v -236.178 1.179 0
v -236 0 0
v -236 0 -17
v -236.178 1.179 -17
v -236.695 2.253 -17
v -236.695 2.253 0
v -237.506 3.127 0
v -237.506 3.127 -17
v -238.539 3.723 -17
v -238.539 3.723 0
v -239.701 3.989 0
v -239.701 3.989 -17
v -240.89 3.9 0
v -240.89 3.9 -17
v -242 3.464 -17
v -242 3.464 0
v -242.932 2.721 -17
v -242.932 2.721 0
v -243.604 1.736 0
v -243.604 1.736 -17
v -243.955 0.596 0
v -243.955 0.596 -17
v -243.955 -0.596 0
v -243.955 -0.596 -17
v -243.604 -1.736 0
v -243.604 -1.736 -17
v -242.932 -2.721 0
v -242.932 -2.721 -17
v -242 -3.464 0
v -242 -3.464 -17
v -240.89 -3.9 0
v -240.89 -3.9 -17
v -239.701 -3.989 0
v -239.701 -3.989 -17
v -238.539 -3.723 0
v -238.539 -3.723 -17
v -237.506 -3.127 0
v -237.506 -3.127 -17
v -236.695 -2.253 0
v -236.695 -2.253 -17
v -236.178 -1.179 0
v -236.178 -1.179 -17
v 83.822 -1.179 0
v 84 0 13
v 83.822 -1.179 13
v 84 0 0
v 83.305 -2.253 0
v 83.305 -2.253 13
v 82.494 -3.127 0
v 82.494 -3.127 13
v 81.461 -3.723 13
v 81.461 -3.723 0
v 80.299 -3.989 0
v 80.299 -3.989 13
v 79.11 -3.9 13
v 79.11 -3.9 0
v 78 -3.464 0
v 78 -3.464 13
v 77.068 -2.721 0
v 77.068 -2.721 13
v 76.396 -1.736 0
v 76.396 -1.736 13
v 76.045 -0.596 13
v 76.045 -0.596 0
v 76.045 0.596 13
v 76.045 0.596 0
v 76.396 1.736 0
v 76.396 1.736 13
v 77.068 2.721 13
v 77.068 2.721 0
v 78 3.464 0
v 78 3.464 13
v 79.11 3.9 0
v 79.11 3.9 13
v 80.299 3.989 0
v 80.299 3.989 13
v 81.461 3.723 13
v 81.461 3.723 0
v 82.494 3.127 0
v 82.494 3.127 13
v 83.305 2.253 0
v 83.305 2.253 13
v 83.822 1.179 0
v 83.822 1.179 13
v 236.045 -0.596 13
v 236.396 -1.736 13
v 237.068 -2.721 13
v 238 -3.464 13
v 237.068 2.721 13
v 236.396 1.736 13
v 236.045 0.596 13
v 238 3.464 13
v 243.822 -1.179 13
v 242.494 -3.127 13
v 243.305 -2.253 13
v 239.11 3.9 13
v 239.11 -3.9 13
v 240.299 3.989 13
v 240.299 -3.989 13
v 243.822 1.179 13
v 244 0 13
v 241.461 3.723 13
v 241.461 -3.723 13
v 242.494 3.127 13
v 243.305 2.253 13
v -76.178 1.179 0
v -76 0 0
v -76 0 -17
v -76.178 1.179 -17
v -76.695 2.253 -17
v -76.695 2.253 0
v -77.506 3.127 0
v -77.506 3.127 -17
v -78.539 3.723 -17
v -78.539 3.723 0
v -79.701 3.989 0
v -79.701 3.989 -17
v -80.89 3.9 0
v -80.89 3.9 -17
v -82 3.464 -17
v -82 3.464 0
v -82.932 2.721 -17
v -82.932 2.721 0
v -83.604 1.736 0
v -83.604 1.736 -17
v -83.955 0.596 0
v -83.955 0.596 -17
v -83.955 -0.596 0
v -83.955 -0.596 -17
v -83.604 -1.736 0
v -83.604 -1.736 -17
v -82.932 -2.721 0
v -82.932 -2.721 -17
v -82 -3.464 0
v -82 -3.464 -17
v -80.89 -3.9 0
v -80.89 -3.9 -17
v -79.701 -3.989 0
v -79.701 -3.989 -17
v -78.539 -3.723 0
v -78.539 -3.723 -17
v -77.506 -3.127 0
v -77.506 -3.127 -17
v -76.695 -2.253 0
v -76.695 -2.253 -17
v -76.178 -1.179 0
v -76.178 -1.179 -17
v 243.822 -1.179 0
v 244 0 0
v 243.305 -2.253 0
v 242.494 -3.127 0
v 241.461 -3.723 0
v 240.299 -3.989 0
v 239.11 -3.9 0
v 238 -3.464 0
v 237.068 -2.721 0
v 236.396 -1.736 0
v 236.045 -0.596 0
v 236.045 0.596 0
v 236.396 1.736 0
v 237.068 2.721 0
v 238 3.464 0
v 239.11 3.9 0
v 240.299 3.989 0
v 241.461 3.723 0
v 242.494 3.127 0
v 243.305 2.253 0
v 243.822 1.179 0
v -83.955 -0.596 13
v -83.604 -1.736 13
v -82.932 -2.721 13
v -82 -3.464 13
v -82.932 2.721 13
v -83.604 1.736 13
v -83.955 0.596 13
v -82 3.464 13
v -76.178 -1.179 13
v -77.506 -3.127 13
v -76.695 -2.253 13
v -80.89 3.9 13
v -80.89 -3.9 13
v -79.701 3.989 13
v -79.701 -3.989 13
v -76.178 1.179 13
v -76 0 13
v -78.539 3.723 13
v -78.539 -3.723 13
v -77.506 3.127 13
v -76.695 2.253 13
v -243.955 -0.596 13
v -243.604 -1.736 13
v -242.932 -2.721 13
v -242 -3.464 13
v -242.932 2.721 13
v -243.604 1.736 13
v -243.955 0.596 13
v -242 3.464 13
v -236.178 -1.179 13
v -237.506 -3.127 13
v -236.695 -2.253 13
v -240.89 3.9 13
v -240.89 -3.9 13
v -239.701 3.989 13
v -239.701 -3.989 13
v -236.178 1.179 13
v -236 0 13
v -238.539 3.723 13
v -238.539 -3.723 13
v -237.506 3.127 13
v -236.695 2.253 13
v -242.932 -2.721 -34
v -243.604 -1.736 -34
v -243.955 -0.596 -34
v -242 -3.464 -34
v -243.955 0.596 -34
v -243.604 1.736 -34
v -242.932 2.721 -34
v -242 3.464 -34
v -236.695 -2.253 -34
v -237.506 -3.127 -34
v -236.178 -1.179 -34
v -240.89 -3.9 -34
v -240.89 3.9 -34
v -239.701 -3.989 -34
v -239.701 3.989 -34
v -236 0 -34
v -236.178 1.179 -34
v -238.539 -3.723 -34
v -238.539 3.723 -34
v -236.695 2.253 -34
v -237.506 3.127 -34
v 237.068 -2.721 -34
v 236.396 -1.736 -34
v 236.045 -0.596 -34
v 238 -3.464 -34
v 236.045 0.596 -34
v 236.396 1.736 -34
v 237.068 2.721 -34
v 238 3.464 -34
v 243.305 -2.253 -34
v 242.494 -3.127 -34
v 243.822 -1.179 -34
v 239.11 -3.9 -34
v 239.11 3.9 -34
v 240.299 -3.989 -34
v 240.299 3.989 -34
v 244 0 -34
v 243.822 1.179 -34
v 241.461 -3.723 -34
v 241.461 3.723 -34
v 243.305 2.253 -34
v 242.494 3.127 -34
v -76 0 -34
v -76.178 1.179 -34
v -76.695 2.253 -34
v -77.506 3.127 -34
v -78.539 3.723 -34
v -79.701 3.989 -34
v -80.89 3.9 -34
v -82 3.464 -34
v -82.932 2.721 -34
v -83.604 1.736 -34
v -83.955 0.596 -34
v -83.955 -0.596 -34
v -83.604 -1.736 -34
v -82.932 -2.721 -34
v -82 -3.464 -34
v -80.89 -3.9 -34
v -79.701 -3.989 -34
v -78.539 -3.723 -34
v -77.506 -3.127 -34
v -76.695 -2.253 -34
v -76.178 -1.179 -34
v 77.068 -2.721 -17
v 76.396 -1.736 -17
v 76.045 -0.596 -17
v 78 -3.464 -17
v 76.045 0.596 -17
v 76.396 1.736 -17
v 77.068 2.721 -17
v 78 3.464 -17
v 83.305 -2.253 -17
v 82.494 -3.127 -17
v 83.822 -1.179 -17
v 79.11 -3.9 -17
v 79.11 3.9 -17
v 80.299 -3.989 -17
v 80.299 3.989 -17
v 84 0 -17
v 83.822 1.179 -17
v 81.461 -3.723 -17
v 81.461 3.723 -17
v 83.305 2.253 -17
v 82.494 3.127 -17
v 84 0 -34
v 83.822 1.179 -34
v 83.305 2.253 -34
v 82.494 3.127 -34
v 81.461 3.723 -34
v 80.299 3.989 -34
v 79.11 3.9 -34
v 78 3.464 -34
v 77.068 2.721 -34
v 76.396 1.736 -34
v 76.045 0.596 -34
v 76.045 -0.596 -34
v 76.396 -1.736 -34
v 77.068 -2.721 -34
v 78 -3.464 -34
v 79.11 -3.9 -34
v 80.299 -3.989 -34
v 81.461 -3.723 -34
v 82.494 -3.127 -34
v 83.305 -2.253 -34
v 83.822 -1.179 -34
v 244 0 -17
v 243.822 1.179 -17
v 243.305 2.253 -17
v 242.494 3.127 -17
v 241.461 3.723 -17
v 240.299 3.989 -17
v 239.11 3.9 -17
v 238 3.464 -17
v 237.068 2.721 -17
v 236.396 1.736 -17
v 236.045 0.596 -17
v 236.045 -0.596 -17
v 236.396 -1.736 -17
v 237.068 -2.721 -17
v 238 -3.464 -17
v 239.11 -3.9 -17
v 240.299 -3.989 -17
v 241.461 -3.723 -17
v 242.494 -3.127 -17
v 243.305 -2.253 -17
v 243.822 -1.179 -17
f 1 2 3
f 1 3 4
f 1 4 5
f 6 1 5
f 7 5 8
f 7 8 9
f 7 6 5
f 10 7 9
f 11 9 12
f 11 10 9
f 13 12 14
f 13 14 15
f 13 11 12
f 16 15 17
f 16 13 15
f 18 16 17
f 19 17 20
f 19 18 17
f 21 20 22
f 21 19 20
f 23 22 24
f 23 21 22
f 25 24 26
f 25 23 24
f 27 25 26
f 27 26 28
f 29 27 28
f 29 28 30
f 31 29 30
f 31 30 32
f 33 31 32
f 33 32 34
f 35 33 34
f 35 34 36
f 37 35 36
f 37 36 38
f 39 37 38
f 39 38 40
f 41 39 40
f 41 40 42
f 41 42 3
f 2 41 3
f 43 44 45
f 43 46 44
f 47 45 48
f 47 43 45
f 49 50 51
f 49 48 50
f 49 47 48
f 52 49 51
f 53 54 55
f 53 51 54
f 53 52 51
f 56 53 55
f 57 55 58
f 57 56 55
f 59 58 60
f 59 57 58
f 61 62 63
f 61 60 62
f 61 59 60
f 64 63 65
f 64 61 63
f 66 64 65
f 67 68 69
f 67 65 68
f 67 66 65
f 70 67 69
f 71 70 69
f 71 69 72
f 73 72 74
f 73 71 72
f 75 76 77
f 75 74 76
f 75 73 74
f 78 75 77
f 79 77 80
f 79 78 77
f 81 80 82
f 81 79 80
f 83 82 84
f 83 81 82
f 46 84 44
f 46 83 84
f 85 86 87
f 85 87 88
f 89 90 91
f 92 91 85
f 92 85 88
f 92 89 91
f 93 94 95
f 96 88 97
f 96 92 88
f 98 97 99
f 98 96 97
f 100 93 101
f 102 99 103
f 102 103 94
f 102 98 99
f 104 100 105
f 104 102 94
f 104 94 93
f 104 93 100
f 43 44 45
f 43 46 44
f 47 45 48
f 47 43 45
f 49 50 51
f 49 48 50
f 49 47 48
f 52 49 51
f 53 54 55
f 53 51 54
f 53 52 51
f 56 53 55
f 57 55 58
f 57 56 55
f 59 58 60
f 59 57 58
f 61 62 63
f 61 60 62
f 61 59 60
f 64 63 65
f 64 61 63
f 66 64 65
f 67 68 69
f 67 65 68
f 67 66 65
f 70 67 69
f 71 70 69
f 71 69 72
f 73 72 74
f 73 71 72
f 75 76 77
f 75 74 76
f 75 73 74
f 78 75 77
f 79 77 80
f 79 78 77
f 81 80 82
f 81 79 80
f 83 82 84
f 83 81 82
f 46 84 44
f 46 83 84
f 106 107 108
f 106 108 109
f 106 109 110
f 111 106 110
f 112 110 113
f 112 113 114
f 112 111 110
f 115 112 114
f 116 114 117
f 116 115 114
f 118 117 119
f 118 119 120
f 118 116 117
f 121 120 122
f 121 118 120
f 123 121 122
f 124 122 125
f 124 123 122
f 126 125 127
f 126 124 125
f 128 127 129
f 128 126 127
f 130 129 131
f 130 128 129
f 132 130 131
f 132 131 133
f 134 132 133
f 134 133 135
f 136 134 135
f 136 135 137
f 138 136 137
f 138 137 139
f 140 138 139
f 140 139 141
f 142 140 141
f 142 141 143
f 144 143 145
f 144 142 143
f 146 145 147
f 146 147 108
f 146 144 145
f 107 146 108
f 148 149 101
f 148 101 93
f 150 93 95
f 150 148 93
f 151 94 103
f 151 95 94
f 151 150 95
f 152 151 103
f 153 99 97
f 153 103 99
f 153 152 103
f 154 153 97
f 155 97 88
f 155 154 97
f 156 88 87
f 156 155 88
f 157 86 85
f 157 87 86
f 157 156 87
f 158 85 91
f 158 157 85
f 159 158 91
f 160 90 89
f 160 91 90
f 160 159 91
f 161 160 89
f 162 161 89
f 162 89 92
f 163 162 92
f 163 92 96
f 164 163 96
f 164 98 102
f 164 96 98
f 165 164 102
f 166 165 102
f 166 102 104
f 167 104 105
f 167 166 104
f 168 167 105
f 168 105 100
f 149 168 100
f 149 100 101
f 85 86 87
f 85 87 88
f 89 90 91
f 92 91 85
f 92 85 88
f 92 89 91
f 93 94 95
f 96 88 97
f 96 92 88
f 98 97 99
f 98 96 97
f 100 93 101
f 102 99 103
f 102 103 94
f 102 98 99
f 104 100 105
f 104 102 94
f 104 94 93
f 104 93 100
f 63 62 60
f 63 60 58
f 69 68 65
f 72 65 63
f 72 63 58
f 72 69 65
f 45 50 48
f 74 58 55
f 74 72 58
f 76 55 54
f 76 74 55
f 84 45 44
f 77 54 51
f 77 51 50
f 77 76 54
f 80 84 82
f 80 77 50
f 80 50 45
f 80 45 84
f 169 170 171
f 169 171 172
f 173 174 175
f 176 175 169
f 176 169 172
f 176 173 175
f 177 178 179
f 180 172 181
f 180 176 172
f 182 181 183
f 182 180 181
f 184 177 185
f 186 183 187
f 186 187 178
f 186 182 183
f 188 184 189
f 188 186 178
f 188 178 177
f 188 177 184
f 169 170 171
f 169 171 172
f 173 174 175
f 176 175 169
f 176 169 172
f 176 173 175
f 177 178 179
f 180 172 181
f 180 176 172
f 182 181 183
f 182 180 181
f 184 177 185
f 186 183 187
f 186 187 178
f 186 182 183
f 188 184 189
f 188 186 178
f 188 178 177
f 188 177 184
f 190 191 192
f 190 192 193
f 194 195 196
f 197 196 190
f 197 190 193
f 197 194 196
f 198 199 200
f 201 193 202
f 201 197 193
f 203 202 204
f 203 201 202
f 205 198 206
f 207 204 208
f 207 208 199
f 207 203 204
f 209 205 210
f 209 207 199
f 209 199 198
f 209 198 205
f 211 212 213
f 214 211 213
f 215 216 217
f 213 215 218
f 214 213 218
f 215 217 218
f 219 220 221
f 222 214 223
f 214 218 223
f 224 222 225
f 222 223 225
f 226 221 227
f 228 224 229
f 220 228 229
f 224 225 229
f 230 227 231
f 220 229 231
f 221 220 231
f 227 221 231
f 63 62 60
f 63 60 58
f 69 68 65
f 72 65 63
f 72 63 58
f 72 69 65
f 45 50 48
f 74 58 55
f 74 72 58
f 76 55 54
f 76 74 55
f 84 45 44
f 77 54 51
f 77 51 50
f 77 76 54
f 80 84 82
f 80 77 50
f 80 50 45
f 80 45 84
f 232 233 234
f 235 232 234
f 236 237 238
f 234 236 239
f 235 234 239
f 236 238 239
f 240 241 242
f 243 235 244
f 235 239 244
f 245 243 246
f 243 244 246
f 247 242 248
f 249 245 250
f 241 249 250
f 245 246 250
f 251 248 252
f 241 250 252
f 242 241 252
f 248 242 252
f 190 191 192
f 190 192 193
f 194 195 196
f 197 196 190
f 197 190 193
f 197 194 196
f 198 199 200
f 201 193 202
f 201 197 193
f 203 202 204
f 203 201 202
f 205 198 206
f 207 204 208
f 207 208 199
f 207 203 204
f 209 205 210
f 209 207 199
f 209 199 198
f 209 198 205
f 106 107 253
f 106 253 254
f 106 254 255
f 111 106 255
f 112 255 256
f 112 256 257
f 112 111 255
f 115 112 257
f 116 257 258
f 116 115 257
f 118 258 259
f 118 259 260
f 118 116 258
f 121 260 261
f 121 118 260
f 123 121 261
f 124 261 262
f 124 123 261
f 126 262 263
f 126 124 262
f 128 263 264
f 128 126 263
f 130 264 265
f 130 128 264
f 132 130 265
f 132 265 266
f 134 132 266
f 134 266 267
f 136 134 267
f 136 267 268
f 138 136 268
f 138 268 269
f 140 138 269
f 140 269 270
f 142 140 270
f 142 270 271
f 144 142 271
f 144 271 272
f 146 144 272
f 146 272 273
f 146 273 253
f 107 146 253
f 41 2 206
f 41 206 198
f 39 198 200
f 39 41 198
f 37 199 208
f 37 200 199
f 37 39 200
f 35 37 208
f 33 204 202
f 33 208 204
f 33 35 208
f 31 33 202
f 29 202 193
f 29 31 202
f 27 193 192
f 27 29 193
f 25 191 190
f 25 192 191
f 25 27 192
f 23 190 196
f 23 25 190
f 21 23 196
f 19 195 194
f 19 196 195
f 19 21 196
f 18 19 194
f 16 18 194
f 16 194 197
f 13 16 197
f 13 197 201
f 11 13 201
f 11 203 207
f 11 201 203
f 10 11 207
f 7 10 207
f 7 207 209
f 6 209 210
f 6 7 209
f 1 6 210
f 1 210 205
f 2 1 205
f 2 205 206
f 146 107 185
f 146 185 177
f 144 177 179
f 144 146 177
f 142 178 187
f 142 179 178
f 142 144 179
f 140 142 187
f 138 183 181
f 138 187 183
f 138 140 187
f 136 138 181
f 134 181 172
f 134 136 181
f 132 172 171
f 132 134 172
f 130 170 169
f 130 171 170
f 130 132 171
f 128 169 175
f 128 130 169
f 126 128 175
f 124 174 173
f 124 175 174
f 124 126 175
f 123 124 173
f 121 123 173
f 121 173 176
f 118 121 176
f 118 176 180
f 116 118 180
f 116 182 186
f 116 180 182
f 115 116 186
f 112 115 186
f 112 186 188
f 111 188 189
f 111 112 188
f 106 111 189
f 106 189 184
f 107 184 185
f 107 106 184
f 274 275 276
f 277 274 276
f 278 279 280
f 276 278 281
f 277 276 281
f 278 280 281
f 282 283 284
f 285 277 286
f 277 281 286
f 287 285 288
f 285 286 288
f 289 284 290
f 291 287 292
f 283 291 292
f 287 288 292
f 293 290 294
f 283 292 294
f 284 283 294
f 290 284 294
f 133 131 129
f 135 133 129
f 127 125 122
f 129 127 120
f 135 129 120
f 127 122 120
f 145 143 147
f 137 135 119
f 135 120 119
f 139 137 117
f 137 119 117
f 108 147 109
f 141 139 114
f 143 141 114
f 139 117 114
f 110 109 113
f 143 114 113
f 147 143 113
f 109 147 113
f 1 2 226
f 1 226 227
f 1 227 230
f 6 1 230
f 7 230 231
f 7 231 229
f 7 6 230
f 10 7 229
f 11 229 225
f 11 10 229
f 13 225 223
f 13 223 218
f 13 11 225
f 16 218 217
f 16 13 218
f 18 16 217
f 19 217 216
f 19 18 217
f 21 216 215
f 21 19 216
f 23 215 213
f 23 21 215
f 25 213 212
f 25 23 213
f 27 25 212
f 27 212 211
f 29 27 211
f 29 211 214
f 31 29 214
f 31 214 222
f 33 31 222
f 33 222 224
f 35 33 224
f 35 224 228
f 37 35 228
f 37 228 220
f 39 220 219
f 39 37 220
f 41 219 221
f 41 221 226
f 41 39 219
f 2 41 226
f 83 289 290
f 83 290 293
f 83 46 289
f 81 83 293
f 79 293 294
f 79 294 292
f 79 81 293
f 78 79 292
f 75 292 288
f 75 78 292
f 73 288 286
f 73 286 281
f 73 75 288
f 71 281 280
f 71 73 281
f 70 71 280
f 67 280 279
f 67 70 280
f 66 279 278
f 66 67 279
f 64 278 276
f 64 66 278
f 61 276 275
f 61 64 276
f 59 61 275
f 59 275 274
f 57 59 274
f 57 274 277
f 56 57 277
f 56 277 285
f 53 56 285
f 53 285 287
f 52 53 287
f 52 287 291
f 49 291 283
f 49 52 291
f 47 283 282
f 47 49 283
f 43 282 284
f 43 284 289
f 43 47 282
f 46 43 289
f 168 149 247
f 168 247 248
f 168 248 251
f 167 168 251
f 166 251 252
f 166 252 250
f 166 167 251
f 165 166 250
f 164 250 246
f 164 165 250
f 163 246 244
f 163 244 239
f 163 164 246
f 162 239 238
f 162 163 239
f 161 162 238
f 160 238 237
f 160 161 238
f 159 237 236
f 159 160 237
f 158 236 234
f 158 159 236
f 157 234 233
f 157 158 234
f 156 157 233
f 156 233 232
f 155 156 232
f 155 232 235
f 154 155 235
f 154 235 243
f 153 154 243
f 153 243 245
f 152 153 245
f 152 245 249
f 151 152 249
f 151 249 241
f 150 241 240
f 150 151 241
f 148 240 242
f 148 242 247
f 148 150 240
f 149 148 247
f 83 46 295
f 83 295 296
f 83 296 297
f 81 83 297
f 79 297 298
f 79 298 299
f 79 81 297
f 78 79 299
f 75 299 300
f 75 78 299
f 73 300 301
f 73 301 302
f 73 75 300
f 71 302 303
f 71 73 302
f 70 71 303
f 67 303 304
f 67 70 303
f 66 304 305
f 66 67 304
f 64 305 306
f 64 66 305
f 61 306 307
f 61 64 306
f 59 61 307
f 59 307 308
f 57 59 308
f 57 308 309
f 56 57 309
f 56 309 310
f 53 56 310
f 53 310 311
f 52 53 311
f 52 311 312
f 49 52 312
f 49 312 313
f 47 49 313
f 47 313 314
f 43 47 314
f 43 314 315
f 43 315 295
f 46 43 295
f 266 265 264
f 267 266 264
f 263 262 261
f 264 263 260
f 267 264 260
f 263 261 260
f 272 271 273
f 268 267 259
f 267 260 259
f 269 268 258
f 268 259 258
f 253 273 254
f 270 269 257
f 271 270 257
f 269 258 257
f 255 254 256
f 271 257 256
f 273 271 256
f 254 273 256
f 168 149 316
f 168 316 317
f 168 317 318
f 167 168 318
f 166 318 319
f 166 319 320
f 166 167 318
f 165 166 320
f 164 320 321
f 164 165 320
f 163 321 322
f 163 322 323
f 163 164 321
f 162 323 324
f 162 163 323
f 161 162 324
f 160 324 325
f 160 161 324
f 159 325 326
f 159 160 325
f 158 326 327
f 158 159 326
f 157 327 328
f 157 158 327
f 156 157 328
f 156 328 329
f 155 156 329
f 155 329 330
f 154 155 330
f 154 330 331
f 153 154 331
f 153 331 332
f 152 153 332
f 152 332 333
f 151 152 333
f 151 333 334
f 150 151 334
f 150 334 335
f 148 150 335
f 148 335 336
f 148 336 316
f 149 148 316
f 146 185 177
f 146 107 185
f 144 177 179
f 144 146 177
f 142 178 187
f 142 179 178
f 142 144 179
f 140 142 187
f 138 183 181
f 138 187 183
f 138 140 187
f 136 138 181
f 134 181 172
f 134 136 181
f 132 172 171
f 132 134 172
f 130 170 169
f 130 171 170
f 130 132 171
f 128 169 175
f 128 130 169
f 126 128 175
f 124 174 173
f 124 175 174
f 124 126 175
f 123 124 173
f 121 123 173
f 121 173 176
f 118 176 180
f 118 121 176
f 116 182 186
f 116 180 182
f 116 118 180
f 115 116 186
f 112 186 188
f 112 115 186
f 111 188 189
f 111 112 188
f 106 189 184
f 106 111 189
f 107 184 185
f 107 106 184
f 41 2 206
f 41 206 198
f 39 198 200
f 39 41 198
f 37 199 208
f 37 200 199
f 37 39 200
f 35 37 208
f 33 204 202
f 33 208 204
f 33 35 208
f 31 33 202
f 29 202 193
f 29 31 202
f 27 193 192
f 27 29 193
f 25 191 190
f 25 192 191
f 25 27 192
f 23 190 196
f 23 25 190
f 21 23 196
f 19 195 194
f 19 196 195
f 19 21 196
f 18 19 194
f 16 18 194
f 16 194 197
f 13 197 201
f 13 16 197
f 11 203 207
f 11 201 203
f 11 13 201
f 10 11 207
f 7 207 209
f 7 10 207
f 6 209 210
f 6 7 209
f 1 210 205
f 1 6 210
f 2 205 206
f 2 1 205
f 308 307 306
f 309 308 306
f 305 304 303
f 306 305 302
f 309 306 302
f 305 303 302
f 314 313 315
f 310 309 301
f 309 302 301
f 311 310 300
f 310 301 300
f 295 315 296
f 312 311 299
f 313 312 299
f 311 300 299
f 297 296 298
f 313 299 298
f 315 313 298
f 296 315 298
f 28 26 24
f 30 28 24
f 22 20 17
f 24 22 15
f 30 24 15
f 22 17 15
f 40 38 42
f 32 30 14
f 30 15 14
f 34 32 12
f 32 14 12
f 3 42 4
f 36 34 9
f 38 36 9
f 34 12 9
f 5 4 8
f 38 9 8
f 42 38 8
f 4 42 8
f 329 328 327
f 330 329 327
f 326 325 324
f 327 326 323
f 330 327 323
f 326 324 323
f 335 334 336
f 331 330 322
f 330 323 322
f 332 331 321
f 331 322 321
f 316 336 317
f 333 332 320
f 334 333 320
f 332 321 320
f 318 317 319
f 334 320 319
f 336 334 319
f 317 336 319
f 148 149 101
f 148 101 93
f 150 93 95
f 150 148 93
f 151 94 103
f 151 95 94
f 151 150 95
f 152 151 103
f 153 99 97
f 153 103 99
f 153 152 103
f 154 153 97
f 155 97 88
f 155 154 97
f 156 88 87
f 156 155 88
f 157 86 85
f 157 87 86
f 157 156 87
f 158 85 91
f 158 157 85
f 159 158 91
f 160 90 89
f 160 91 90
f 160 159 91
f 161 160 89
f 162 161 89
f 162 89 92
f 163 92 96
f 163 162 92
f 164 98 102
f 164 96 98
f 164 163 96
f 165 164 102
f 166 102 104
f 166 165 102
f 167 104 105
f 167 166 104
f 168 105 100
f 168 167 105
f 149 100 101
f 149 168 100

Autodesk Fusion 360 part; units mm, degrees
sketch "Sketch1" plane through (0, 0, 0) normal (0, 0, 1) x (1, 0, 0)
  line L0 (310, 9) -> (-310, 9)
  line L1 (-310, 9) -> (-310, -9)
  line L2 (-310, -9) -> (310, -9)
  line L3 (310, -9) -> (310, 9)
  line L4 (310, 9) -> (-310, -9) construction
  line L5 (-310, 9) -> (310, -9) construction
  line L6 (-310, 0) -> (310, 0) construction
  circle A0 centre (-240, 0) radius 4
  dimension "d9" = 620
  dimension "d10" = 18
  dimension "d11" = 8
  dimension "d12" = 70
extrude "Extrude1" add sketch "Sketch1" along normal blind 13 and the other way blind 17 contours A0 makes body 1
extrude "Extrude2" add sketch "Sketch1" along normal blind 13 and the other way blind 34 separate body contours A0 makes body 2
copy_body "Body->Comp1" bodies 1 removing the originals makes body 3 in component "Dowel"
copy_body "CutPasteBodies1" bodies 2 removing the originals makes body 4 in component "Dowel"
pattern_linear "00000000-0000-0000-0000-000000000000" [suppressed]
component "Dowel" placed x (1, 0, 0) y (0, 1, 0) z (0, 0, 1) at (0, 0, 0)
component "Dowel" placed x (1, 0, 0) y (0, 1, 0) z (0, 0, 1) at (160, 0, 0)
component "Dowel" placed x (1, 0, 0) y (0, 1, 0) z (0, 0, 1) at (320, 0, 0)
component "Dowel" placed x (1, 0, 0) y (0, 1, 0) z (0, 0, 1) at (480, 0, 0)
equation "ContactPatchLength = 620 mm" comment "Driven length"
equation "ContactPatchWidth = 18 mm" comment "Pillar Board Thickness"
equation "MinFromEdge = 20 mm"
equation "StepBetweenDowels = 160 mm"
equation "DowelDistributionLength = ContactPatchLength - MinFromEdge * 2"
equation "DowelNo = floor(DowelDistributionLength / StepBetweenDowels) + 1"
equation "DistributionLength = StepBetweenDowels * ( DowelNo - 1 )"
equation "FromEdge = ( ContactPatchLength - DistributionLength ) / 2"
equation "d9 = ContactPatchLength"
equation "d10 = ContactPatchWidth"
equation "d11 = DowelDia"
equation "d12 = FromEdge"
equation "d15 = 30 mm - 13 mm"
equation "d25 = DowelNo"
equation "d27 = StepBetweenDowels"
equation "DowelDia = 8 mm"
properties part number "D8x30"
